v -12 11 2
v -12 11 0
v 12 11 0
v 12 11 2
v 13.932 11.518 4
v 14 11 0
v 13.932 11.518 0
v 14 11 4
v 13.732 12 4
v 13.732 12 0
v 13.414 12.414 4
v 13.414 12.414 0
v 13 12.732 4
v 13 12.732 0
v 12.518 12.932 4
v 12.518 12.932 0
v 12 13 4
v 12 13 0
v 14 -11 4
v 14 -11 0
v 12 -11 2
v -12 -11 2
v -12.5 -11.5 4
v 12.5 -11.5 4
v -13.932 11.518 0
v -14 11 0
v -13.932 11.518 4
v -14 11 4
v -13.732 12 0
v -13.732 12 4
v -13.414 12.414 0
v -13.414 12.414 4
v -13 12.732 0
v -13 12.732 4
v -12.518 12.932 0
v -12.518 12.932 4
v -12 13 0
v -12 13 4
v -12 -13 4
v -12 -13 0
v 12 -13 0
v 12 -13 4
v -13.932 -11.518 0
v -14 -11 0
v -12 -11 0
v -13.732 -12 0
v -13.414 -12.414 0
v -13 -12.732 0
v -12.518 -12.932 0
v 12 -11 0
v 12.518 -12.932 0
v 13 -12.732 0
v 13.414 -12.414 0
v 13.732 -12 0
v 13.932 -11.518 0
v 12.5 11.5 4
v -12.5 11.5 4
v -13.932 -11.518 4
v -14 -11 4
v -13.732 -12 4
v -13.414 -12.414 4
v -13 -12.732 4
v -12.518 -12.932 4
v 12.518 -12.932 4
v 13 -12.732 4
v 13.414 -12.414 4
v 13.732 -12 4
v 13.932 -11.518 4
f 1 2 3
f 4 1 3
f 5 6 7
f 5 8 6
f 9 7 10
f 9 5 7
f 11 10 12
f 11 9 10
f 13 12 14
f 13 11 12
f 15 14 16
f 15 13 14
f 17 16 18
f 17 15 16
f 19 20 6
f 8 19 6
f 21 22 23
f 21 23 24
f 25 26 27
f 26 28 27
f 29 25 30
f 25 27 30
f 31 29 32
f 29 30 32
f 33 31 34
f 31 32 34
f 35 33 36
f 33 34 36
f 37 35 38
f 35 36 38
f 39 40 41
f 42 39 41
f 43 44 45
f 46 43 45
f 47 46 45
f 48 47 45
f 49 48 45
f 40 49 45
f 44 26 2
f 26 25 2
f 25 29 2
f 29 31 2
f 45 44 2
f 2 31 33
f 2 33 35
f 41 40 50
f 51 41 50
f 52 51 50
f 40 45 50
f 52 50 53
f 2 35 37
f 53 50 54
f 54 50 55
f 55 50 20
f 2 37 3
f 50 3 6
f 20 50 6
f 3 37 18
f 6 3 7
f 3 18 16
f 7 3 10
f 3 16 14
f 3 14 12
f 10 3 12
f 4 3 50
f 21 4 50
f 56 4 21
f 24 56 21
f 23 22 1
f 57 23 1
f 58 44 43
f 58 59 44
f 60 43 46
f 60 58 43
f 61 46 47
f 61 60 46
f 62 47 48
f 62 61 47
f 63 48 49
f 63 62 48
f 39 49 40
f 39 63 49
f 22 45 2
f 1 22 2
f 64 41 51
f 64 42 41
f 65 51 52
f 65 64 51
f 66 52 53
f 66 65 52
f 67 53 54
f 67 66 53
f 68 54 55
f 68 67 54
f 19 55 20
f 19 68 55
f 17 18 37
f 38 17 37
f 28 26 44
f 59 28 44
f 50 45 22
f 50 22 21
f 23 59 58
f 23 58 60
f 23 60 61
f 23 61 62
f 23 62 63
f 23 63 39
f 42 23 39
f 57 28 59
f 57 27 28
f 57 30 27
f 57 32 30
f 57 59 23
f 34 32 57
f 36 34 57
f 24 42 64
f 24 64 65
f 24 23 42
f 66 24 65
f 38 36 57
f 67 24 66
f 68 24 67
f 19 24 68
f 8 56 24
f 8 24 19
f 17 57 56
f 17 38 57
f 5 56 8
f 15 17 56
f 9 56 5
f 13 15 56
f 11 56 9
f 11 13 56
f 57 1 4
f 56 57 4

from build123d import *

# Parameters (mm, degrees)
F0_W     = 24
F0_H     = 2
F1_DEPTH = 4
F2_SIZE2 = 2
F2_SIZE  = 0.5
F3_R     = 2


with BuildPart() as f1:
    # F0 (on Top) → F1 (new body)
    with BuildSketch(Plane.XY):
        Polygon((-12, 13), (-14, 13), (-14, -13), (-12, -13), (-12, -11), (-12, 11), align=None)
        with Locations((0, 12)):
            Rectangle(F0_W, F0_H)
        Polygon((14, 13), (12, 13), (12, 11), (12, -11), (12, -13), (14, -13), align=None)
        with Locations((0, -12)):
            Rectangle(F0_W, F0_H)
    extrude(amount=F1_DEPTH)

    # F2
    f2_edges = [f1.edges().sort_by_distance(p)[0] for p in [
        (-12, 0, 4),
        (0, 11, 4),
        (12, 0, 4),
        (0, -11, 4),
    ]]
    f2_side = f1.faces().sort_by_distance((-13.617901, 0, 4))[0]
    chamfer(f2_edges, length=F2_SIZE, length2=F2_SIZE2, reference=f2_side)

    # F3
    f3_edges = [f1.edges().sort_by_distance(p)[0] for p in [
        (14, -13, 2),
        (-14, -13, 2),
        (-14, 13, 2),
        (14, 13, 2),
    ]]
    fillet(f3_edges, radius=F3_R)


solid = f1.part
